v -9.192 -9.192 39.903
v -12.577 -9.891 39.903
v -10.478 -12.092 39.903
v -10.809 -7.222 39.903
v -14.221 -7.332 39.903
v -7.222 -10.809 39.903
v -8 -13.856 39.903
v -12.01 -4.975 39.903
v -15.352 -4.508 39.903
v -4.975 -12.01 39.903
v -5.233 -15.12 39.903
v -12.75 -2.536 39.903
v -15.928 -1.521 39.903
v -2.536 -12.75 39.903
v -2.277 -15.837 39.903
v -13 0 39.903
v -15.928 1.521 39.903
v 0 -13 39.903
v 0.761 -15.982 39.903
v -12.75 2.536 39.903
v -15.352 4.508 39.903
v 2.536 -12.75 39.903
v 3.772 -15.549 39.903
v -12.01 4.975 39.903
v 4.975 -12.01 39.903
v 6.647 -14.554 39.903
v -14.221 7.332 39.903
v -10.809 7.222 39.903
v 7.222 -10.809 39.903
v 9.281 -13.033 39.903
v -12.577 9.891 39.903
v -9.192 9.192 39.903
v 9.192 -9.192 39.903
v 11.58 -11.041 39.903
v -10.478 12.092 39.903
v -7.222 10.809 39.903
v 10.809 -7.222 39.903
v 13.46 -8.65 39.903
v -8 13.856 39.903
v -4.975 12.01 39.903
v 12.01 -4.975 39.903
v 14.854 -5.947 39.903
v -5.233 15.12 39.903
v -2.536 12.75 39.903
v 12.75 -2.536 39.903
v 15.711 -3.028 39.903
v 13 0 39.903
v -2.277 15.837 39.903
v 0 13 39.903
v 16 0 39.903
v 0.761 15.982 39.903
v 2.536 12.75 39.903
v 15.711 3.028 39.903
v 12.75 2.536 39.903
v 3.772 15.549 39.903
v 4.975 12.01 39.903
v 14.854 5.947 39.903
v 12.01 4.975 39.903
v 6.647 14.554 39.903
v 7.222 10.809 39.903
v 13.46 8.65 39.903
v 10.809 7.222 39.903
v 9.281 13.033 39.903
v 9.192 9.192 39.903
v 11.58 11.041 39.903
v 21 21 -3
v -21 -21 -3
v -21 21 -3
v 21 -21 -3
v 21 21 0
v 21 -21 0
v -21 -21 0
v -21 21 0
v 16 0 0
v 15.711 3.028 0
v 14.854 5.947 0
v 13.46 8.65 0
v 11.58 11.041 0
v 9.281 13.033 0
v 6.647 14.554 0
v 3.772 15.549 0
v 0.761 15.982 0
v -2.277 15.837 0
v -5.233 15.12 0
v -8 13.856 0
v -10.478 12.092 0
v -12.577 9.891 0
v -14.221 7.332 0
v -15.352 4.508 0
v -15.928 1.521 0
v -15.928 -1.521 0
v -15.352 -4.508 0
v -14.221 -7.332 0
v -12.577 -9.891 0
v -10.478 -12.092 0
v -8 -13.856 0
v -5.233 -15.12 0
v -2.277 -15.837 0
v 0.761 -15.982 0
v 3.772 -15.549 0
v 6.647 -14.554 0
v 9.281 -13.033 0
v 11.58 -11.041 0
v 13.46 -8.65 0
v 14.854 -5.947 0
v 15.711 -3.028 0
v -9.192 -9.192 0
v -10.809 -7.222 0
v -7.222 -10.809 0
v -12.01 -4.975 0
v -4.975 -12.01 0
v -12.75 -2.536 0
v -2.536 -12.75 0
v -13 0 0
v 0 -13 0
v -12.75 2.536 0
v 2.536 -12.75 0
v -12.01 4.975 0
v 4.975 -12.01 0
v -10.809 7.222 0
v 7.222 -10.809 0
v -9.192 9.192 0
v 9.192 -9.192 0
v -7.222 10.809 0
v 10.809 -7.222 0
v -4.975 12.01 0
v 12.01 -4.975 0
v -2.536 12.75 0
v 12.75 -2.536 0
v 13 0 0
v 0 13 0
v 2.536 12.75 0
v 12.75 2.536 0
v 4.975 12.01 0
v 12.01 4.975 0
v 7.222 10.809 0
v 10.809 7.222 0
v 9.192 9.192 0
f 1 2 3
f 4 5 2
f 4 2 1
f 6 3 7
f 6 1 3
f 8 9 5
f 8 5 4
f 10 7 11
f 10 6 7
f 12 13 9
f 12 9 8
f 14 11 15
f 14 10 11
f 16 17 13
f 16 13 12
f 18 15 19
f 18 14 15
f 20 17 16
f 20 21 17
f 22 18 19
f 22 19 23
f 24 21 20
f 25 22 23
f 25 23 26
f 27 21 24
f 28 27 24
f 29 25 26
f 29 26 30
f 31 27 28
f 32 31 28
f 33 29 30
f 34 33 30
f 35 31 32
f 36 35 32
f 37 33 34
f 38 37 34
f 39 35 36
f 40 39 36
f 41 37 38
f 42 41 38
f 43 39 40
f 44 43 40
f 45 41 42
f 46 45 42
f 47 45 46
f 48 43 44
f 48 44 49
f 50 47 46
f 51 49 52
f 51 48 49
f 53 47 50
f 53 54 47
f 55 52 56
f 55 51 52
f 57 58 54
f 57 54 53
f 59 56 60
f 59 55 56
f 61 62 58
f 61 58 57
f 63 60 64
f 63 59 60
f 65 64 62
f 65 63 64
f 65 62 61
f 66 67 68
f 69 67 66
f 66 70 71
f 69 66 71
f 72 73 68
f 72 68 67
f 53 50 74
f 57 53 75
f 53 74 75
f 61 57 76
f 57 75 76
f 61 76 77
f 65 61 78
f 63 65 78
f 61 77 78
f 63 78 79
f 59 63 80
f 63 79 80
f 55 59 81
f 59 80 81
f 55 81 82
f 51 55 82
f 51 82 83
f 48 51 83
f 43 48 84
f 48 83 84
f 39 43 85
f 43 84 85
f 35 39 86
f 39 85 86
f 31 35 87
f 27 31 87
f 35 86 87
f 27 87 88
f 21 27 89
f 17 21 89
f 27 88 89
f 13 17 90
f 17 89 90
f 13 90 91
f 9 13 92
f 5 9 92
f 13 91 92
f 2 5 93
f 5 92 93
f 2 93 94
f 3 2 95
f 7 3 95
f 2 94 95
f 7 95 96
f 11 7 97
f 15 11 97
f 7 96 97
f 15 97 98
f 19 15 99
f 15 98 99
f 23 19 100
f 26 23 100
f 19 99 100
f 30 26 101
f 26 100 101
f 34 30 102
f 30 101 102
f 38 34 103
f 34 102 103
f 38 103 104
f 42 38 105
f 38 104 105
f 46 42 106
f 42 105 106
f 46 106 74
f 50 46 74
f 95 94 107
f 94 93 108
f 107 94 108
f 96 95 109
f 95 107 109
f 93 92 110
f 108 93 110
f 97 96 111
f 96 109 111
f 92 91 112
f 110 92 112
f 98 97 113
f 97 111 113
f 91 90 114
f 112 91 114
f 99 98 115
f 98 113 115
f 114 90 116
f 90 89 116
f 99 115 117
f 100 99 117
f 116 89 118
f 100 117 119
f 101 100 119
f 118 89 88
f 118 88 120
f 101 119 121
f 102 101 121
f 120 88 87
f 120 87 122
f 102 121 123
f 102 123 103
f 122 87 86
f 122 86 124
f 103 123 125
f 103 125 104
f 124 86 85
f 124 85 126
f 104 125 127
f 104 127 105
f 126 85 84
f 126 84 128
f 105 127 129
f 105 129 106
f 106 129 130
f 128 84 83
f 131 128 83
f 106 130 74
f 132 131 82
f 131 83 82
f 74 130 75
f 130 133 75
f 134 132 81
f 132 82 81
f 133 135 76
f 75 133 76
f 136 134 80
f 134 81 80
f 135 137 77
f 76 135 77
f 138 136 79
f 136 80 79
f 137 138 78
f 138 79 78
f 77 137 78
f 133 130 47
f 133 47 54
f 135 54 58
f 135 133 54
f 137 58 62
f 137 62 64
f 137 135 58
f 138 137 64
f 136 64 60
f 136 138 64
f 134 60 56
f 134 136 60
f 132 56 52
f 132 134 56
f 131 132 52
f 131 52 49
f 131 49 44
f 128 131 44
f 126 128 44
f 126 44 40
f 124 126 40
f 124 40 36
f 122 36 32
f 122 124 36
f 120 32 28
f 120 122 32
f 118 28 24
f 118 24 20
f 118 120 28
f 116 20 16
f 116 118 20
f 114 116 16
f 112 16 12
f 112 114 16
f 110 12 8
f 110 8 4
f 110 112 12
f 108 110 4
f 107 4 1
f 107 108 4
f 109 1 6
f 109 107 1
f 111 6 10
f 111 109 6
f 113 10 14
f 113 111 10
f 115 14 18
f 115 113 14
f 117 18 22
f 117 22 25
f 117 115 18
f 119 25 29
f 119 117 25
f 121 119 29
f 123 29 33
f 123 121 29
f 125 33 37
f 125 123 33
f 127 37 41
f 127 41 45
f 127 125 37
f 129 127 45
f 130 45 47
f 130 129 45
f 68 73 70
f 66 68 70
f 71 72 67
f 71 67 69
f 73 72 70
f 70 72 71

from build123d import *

# Parameters (mm, degrees)
F0_R     = 16
F0_R_2   = 13
F1_DEPTH = 39.9034
F2_W     = 42
F2_H     = 42
F2_R     = 16
F2_R_2   = 13
F3_DEPTH = 3


with BuildPart() as f1:
    # F0 (on Top) → F1 (new body)
    with BuildSketch(Plane.XY):
        Circle(F0_R)
        Circle(F0_R_2, mode=Mode.SUBTRACT)
    extrude(amount=F1_DEPTH)


with BuildPart() as f3:
    # F2 (on face) → F3 (new body)
    with BuildSketch(Plane(origin=(0, 0, 0), x_dir=(1, 0, 0), z_dir=(0, 0, -1))):
        Rectangle(F2_W, F2_H)
        Circle(F2_R, mode=Mode.SUBTRACT)
        Circle(F2_R)
        Circle(F2_R_2, mode=Mode.SUBTRACT)
        Circle(F2_R_2)
    extrude(amount=F3_DEPTH)


solid = Compound([f1.part, f3.part])
